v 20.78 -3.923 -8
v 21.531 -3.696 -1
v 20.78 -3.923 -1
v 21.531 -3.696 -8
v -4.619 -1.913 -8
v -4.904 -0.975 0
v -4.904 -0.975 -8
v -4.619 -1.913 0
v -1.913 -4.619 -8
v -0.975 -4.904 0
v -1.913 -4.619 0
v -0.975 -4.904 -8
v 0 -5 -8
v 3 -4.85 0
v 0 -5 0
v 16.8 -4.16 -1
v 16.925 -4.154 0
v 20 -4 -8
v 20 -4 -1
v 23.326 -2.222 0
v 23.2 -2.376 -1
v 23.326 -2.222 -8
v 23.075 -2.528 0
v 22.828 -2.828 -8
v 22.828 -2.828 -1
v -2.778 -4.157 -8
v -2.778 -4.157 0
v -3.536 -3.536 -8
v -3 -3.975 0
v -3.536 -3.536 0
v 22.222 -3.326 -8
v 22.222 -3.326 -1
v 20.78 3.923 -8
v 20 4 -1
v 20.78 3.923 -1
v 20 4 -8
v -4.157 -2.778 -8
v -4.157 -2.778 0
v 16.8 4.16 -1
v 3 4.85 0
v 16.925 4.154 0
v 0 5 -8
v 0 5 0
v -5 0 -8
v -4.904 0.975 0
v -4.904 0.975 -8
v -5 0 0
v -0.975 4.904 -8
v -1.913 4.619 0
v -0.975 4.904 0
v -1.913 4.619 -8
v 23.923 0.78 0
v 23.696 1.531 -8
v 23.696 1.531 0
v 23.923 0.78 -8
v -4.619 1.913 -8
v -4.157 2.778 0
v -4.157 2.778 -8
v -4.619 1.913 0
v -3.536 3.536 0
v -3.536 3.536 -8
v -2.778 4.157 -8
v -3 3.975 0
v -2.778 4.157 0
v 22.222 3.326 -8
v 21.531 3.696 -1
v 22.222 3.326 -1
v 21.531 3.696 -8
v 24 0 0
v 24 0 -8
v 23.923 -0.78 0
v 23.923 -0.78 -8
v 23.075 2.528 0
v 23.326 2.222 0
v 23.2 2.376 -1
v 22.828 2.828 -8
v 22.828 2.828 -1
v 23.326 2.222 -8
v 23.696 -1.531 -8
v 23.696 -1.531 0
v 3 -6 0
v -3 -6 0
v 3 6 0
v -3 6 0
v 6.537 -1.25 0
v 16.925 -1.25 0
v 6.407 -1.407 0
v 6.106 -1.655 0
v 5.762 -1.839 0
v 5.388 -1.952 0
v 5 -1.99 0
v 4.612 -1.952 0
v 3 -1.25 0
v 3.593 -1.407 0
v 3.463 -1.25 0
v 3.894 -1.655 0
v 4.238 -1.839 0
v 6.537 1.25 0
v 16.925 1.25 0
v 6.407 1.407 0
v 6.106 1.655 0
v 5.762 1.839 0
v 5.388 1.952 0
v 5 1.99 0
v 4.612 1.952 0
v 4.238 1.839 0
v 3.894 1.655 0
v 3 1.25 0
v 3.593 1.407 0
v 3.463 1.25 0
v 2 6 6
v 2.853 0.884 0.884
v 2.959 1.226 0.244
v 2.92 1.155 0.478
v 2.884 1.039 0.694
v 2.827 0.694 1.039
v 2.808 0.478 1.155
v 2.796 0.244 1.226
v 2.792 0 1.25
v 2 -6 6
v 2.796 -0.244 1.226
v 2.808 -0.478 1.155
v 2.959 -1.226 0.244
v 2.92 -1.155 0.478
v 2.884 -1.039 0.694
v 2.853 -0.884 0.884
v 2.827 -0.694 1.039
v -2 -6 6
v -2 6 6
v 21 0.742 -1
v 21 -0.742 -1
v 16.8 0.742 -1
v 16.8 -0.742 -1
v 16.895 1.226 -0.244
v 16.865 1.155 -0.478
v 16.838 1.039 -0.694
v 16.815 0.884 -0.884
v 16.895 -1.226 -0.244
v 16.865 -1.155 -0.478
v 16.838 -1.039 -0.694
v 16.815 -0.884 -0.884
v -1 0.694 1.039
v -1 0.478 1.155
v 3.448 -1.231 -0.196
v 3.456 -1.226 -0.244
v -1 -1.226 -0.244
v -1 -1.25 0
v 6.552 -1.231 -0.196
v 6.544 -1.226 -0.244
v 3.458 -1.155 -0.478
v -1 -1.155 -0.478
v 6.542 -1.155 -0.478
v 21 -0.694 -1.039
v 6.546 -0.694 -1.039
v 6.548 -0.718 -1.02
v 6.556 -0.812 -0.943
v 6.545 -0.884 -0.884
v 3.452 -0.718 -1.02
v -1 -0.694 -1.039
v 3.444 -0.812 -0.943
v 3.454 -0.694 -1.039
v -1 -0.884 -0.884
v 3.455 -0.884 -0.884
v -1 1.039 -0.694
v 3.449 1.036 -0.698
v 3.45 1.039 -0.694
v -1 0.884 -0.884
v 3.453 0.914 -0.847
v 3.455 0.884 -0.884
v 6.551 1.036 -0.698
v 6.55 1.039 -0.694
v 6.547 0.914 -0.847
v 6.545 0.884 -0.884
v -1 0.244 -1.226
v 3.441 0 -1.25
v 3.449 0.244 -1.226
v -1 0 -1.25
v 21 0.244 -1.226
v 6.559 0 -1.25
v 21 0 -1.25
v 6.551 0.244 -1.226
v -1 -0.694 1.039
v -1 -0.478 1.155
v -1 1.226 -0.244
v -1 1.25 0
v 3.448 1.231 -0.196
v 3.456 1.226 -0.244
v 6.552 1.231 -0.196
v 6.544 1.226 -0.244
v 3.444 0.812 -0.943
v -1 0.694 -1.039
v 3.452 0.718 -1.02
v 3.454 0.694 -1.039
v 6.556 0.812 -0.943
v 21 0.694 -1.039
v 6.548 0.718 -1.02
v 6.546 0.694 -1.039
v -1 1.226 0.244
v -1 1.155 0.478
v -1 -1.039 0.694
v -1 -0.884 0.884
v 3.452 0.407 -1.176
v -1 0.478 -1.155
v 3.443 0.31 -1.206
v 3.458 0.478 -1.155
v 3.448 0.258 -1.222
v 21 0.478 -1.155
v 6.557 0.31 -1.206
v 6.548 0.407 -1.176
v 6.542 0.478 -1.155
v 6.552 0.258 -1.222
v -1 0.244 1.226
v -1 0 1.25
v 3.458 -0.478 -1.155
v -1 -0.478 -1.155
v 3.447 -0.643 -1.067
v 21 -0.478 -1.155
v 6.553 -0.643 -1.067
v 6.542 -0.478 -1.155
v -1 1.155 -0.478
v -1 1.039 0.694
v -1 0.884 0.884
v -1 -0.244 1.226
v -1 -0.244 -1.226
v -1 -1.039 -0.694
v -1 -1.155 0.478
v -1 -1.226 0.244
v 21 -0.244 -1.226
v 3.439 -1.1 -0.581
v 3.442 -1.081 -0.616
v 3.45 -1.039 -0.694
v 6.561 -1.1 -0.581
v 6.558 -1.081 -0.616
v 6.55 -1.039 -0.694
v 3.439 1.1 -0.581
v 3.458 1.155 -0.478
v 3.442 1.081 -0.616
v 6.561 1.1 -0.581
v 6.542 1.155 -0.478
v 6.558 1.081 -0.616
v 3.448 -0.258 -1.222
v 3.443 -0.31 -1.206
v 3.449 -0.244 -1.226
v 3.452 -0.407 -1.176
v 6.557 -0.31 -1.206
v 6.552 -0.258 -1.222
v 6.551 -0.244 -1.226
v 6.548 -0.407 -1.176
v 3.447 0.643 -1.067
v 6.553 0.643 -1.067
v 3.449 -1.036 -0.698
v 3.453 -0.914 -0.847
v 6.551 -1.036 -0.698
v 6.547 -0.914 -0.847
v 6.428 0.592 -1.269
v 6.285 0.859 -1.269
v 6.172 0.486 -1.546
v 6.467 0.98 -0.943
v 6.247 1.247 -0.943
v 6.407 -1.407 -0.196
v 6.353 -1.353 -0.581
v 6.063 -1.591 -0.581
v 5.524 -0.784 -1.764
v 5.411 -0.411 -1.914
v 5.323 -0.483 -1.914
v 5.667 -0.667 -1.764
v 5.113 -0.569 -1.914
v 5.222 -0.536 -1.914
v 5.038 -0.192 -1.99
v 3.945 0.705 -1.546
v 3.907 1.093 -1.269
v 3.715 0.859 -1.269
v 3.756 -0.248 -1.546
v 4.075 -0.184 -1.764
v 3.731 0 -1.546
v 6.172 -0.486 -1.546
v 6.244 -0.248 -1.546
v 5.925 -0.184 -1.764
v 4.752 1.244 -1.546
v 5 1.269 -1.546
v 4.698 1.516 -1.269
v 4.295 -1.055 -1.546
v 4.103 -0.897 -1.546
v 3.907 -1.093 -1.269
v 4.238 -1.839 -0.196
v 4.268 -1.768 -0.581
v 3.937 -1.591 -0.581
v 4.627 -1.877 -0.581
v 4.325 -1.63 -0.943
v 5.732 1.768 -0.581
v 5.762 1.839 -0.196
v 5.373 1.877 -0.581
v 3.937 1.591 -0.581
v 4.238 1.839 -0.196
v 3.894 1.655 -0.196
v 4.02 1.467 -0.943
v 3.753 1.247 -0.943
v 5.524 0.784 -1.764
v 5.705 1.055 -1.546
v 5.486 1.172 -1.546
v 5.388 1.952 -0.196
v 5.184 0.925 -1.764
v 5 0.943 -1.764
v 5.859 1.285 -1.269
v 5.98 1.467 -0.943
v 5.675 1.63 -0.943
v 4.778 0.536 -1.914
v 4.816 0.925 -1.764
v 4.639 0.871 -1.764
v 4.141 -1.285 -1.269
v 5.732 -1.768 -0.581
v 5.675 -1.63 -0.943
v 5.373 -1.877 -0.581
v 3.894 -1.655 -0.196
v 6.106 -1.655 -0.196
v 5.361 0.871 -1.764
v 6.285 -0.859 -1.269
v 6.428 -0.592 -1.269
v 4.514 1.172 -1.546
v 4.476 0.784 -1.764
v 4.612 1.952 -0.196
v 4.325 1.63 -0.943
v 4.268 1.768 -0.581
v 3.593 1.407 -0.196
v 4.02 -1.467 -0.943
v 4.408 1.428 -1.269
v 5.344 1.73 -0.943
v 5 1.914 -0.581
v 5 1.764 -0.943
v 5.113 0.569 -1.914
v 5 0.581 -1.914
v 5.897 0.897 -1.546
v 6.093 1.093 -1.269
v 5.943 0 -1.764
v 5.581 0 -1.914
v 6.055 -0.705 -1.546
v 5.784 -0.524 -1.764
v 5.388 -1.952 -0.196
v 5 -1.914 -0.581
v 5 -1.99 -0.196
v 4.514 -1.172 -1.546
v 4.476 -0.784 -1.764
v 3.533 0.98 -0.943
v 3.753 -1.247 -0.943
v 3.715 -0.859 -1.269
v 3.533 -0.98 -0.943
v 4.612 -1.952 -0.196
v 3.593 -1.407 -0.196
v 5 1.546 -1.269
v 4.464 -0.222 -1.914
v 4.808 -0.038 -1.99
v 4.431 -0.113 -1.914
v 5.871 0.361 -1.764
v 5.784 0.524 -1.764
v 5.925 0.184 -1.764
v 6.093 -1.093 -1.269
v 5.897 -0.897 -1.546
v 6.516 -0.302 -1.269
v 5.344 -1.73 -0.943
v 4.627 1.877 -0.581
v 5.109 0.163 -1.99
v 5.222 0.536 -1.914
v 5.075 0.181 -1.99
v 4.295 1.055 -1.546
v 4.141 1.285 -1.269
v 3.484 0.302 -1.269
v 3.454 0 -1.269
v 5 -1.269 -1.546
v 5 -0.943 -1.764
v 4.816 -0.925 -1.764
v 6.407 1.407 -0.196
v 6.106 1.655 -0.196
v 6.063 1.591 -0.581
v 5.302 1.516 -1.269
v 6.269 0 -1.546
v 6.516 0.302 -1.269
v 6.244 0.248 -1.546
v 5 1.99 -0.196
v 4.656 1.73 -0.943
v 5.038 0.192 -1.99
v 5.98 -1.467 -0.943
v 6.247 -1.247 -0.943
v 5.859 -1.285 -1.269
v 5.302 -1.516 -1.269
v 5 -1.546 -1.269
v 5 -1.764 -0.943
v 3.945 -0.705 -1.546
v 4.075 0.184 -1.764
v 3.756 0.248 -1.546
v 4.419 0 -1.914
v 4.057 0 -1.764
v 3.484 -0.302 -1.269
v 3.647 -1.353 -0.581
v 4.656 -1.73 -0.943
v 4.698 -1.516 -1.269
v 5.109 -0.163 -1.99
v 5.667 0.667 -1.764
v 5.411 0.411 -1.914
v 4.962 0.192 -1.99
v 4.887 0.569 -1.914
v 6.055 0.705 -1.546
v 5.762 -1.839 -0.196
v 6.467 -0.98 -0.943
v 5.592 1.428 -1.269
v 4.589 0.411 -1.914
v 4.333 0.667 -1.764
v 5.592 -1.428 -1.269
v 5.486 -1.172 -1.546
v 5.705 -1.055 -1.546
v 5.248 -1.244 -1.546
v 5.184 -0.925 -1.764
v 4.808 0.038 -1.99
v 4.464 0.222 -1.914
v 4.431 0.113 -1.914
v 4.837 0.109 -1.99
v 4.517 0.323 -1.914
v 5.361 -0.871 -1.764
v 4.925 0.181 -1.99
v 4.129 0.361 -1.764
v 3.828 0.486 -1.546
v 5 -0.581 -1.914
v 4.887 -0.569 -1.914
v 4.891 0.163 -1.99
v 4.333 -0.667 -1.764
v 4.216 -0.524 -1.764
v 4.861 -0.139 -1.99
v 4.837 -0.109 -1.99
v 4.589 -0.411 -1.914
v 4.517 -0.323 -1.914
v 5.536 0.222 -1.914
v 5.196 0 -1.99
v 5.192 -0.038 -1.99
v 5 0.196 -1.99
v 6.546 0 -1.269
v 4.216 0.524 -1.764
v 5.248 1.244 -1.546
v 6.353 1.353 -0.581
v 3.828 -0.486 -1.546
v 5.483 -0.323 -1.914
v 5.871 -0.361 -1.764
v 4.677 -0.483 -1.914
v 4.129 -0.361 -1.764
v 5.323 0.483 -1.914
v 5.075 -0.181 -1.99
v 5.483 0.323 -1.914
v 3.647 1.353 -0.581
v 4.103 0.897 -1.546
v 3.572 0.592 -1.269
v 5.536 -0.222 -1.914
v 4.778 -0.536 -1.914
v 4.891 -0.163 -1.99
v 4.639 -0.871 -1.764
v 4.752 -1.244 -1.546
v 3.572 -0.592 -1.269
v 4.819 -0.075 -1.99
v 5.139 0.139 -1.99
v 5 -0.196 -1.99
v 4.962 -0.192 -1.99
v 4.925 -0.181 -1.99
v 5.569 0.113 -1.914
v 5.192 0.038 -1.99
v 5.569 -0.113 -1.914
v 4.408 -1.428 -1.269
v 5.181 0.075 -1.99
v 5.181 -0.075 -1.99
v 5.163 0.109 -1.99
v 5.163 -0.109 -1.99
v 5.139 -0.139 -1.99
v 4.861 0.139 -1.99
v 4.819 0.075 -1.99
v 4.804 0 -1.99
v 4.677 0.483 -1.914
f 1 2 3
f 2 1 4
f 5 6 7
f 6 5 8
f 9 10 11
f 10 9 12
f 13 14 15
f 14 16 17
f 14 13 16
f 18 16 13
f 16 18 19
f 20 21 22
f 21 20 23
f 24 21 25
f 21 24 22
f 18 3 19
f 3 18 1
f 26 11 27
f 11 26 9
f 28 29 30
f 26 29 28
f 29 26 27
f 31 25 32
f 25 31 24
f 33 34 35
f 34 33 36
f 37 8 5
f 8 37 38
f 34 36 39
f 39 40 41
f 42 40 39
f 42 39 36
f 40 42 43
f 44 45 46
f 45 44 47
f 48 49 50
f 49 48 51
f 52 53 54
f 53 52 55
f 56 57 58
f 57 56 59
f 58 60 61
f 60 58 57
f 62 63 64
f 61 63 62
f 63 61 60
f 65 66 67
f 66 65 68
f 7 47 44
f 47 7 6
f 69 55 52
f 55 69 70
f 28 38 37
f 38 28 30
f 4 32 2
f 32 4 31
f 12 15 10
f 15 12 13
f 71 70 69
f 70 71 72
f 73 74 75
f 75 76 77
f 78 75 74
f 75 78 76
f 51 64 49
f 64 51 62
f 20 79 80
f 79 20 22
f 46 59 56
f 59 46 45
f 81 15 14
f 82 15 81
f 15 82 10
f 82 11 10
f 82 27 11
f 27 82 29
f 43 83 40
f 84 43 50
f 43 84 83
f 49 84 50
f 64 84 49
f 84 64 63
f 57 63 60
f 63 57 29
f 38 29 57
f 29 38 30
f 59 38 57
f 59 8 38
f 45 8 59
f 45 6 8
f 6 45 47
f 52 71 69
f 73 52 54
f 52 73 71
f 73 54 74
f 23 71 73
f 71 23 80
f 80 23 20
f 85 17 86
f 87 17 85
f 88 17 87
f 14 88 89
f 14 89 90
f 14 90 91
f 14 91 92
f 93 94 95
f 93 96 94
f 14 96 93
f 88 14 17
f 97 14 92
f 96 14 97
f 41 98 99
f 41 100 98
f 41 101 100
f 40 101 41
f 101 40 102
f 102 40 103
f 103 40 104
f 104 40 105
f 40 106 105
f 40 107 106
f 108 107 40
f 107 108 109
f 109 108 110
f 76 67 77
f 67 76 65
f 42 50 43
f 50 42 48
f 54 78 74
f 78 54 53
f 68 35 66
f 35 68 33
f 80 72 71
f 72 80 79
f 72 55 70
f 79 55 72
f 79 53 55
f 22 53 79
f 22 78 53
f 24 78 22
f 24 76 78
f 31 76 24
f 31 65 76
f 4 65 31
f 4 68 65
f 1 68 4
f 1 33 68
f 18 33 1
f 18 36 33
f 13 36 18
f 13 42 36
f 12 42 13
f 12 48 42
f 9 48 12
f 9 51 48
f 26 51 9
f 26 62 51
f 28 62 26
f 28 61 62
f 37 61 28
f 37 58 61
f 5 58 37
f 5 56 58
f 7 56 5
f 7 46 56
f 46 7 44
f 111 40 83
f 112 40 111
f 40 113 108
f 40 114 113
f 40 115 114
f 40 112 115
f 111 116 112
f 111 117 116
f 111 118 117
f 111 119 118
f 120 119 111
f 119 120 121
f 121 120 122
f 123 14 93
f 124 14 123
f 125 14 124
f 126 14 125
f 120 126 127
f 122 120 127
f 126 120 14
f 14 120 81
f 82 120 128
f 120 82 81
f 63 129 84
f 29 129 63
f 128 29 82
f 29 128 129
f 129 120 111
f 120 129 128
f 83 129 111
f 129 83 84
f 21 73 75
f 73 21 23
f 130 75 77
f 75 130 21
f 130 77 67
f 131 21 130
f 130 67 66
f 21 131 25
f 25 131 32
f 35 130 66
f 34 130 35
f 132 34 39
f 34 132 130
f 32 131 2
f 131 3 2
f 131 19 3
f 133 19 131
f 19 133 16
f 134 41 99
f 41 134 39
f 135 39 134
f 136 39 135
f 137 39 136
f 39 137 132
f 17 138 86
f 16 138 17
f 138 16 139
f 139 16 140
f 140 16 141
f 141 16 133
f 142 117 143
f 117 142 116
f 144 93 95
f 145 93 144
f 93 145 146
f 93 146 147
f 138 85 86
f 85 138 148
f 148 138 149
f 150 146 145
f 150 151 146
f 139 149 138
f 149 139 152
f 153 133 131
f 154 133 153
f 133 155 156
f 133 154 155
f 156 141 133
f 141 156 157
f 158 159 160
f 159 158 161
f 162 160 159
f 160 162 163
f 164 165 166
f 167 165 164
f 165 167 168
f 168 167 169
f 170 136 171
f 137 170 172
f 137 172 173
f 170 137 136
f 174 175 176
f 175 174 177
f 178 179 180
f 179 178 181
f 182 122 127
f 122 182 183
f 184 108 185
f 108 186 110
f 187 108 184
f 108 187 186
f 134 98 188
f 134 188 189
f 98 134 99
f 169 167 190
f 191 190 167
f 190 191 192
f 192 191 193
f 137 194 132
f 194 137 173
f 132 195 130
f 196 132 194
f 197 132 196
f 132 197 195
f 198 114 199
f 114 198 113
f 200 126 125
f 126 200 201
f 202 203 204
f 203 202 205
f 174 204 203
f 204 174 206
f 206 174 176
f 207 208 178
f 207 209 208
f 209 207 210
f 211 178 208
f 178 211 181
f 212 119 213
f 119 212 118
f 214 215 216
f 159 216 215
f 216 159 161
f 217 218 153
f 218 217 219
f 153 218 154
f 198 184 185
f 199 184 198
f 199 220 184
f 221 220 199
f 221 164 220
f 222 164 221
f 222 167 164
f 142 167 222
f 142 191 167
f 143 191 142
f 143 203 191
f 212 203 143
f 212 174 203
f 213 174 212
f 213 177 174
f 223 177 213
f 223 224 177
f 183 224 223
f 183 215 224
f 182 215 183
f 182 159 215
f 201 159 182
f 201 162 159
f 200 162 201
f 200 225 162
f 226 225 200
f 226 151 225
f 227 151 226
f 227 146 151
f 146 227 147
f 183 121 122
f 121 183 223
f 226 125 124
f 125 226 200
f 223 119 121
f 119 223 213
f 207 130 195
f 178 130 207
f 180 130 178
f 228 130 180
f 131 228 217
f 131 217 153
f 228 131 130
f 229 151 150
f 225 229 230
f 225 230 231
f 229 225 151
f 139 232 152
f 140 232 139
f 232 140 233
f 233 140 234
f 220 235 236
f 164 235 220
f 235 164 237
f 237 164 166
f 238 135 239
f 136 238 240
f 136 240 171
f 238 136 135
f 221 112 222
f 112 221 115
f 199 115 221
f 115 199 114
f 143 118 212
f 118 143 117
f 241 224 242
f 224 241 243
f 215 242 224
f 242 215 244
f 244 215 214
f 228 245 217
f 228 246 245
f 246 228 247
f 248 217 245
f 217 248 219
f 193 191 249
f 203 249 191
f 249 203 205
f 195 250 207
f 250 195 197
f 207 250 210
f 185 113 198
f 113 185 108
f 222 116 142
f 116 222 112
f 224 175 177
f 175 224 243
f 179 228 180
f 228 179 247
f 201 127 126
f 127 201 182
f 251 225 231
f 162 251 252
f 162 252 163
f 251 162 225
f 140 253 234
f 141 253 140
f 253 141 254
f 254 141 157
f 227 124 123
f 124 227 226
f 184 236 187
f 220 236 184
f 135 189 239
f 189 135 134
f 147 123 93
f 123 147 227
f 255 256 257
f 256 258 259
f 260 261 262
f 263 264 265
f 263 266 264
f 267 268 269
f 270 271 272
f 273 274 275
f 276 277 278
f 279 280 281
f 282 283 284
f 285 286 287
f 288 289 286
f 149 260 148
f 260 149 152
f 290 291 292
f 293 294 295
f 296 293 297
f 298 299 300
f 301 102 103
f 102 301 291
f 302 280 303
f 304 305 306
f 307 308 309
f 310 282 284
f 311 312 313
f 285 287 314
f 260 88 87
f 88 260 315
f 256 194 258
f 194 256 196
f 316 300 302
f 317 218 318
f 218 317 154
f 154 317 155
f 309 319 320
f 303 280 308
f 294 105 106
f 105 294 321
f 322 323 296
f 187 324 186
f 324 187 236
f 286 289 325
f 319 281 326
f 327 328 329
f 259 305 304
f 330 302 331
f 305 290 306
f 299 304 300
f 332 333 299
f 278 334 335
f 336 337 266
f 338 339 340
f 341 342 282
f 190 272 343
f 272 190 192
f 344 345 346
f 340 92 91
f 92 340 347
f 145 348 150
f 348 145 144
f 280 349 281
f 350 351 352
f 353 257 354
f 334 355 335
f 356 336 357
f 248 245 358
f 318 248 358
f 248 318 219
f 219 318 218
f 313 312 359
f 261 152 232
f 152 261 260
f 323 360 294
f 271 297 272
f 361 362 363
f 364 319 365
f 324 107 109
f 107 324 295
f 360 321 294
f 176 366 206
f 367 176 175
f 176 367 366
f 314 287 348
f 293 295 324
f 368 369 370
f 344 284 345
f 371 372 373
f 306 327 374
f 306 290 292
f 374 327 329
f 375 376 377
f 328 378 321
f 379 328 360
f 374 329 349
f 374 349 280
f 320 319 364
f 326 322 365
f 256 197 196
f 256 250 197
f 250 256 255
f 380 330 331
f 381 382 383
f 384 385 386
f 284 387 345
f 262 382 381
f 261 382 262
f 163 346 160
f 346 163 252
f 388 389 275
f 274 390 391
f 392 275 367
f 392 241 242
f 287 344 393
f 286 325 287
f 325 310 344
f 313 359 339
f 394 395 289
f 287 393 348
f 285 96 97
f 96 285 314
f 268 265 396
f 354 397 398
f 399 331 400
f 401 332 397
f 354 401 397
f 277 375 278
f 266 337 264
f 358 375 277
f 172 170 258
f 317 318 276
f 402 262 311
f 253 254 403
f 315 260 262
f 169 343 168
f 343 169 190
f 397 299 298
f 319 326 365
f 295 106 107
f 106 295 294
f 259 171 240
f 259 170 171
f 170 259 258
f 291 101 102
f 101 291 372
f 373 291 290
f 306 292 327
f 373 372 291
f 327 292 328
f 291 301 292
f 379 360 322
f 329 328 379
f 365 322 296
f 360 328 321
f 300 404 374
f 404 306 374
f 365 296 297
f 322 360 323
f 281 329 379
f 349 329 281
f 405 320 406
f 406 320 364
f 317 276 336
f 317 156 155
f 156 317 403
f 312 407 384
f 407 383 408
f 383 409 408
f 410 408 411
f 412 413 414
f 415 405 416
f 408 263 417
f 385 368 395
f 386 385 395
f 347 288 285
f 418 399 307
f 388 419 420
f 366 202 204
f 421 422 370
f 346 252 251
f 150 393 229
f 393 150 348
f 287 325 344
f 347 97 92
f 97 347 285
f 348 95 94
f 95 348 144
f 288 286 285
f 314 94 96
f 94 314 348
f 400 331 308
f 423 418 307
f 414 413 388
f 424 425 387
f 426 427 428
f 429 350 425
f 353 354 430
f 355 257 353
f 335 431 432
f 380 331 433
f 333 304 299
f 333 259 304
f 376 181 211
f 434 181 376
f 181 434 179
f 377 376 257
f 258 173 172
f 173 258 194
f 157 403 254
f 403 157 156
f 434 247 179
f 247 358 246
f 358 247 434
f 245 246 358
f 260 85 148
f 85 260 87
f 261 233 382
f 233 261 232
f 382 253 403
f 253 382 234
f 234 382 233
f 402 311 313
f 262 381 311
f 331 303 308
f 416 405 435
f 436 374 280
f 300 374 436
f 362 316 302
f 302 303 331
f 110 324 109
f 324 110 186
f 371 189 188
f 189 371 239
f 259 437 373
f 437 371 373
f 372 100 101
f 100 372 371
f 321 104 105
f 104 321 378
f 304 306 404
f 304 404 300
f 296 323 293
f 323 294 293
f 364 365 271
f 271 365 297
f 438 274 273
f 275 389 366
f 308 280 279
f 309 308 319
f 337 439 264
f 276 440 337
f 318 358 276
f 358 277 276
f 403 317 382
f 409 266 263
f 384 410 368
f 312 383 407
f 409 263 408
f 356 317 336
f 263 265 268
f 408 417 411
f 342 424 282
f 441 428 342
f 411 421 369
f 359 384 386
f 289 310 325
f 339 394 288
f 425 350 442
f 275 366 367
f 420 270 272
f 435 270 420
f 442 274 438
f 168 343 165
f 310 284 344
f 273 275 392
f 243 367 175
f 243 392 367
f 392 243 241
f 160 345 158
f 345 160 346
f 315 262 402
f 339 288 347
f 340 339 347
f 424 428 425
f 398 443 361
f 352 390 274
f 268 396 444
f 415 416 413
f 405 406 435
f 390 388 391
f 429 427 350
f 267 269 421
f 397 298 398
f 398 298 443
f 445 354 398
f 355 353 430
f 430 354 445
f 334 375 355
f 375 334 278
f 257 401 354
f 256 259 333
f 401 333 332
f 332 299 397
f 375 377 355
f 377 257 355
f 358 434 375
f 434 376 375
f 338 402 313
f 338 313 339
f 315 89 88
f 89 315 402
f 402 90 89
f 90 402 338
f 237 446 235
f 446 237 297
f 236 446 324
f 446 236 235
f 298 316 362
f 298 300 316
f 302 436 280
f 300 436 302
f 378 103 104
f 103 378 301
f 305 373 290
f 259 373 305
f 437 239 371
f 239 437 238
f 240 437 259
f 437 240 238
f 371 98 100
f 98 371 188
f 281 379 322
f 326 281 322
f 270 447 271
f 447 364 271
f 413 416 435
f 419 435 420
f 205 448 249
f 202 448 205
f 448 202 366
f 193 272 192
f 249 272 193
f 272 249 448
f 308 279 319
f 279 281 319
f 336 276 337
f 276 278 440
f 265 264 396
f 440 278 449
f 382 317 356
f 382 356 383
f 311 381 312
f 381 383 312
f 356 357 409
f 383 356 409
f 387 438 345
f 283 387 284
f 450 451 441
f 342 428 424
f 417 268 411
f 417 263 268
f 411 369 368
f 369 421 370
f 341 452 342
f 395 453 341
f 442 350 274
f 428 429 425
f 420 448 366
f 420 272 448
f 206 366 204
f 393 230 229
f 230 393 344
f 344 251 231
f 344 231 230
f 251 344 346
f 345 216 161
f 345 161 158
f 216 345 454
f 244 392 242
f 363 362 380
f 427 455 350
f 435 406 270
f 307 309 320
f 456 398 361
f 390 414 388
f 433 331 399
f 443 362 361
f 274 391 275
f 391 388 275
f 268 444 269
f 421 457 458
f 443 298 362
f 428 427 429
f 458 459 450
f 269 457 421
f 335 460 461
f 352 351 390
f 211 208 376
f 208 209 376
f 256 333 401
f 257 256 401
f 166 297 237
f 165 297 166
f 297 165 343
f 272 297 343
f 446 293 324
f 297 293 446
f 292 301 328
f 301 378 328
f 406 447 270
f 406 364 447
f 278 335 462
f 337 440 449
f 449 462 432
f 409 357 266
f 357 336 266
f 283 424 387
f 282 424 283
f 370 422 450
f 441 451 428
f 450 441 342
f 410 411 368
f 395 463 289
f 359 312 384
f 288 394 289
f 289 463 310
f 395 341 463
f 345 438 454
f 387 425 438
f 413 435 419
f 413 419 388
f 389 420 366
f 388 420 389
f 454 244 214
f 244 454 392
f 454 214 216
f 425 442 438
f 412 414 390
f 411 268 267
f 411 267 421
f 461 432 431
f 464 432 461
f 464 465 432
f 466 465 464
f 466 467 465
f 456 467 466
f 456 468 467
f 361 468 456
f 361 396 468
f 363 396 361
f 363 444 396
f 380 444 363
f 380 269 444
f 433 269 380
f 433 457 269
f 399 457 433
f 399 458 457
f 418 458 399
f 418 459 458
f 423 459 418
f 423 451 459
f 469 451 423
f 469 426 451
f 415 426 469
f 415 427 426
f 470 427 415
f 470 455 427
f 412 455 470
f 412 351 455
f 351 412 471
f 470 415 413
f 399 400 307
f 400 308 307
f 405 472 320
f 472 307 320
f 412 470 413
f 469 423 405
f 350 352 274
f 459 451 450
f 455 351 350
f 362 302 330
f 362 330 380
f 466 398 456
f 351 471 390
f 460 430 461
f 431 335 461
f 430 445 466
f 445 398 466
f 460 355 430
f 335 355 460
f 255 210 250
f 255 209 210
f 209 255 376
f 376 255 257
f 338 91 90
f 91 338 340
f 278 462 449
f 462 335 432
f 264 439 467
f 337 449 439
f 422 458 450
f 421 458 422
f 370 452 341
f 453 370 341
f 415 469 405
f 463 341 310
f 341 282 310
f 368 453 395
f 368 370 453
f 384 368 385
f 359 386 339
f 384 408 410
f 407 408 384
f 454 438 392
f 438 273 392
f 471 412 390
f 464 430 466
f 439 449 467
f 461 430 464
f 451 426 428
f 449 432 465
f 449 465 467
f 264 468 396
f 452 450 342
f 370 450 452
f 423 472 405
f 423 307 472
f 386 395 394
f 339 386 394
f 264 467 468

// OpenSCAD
// COBRA-Snap Finger Segment - middle
// Dovetail slide joints, no glue needed

$fn = 32;

module finger_segment() {
    difference() {
        union() {
            // Main body
            hull() {
                translate([0, 0, -4])
                cylinder(h=8, d=10, center=true);
                
                translate([20.0, 0, -4])
                cylinder(h=8, d=8.0, center=true);
            }
            
            // Male dovetail (proximal end)
            translate([0, 0, 0])
            rotate([90, 0, 0])
            linear_extrude(height=12, center=true)
            polygon(points=[[-3, 0], [3, 0], [2, 6], [-2, 6]]);
        }
        
        // Female dovetail socket (distal end) - skip for distal
        
        translate([20.0, 0, 0])
        rotate([90, 0, 0])
        linear_extrude(height=10.0, center=true)
        polygon(points=[[-3.2, -1], [3.2, -1], [2.2, 7], [-2.2, 7]]);
        
        
        // Tendon channel
        translate([10.0, 0, 0])
        rotate([0, 90, 0])
        cylinder(h=22.0, d=2.5, center=true);
        
        // Quick-connect socket for tendon
        translate([5, 0, 0])
        sphere(d=4);
    }
}

finger_segment();
